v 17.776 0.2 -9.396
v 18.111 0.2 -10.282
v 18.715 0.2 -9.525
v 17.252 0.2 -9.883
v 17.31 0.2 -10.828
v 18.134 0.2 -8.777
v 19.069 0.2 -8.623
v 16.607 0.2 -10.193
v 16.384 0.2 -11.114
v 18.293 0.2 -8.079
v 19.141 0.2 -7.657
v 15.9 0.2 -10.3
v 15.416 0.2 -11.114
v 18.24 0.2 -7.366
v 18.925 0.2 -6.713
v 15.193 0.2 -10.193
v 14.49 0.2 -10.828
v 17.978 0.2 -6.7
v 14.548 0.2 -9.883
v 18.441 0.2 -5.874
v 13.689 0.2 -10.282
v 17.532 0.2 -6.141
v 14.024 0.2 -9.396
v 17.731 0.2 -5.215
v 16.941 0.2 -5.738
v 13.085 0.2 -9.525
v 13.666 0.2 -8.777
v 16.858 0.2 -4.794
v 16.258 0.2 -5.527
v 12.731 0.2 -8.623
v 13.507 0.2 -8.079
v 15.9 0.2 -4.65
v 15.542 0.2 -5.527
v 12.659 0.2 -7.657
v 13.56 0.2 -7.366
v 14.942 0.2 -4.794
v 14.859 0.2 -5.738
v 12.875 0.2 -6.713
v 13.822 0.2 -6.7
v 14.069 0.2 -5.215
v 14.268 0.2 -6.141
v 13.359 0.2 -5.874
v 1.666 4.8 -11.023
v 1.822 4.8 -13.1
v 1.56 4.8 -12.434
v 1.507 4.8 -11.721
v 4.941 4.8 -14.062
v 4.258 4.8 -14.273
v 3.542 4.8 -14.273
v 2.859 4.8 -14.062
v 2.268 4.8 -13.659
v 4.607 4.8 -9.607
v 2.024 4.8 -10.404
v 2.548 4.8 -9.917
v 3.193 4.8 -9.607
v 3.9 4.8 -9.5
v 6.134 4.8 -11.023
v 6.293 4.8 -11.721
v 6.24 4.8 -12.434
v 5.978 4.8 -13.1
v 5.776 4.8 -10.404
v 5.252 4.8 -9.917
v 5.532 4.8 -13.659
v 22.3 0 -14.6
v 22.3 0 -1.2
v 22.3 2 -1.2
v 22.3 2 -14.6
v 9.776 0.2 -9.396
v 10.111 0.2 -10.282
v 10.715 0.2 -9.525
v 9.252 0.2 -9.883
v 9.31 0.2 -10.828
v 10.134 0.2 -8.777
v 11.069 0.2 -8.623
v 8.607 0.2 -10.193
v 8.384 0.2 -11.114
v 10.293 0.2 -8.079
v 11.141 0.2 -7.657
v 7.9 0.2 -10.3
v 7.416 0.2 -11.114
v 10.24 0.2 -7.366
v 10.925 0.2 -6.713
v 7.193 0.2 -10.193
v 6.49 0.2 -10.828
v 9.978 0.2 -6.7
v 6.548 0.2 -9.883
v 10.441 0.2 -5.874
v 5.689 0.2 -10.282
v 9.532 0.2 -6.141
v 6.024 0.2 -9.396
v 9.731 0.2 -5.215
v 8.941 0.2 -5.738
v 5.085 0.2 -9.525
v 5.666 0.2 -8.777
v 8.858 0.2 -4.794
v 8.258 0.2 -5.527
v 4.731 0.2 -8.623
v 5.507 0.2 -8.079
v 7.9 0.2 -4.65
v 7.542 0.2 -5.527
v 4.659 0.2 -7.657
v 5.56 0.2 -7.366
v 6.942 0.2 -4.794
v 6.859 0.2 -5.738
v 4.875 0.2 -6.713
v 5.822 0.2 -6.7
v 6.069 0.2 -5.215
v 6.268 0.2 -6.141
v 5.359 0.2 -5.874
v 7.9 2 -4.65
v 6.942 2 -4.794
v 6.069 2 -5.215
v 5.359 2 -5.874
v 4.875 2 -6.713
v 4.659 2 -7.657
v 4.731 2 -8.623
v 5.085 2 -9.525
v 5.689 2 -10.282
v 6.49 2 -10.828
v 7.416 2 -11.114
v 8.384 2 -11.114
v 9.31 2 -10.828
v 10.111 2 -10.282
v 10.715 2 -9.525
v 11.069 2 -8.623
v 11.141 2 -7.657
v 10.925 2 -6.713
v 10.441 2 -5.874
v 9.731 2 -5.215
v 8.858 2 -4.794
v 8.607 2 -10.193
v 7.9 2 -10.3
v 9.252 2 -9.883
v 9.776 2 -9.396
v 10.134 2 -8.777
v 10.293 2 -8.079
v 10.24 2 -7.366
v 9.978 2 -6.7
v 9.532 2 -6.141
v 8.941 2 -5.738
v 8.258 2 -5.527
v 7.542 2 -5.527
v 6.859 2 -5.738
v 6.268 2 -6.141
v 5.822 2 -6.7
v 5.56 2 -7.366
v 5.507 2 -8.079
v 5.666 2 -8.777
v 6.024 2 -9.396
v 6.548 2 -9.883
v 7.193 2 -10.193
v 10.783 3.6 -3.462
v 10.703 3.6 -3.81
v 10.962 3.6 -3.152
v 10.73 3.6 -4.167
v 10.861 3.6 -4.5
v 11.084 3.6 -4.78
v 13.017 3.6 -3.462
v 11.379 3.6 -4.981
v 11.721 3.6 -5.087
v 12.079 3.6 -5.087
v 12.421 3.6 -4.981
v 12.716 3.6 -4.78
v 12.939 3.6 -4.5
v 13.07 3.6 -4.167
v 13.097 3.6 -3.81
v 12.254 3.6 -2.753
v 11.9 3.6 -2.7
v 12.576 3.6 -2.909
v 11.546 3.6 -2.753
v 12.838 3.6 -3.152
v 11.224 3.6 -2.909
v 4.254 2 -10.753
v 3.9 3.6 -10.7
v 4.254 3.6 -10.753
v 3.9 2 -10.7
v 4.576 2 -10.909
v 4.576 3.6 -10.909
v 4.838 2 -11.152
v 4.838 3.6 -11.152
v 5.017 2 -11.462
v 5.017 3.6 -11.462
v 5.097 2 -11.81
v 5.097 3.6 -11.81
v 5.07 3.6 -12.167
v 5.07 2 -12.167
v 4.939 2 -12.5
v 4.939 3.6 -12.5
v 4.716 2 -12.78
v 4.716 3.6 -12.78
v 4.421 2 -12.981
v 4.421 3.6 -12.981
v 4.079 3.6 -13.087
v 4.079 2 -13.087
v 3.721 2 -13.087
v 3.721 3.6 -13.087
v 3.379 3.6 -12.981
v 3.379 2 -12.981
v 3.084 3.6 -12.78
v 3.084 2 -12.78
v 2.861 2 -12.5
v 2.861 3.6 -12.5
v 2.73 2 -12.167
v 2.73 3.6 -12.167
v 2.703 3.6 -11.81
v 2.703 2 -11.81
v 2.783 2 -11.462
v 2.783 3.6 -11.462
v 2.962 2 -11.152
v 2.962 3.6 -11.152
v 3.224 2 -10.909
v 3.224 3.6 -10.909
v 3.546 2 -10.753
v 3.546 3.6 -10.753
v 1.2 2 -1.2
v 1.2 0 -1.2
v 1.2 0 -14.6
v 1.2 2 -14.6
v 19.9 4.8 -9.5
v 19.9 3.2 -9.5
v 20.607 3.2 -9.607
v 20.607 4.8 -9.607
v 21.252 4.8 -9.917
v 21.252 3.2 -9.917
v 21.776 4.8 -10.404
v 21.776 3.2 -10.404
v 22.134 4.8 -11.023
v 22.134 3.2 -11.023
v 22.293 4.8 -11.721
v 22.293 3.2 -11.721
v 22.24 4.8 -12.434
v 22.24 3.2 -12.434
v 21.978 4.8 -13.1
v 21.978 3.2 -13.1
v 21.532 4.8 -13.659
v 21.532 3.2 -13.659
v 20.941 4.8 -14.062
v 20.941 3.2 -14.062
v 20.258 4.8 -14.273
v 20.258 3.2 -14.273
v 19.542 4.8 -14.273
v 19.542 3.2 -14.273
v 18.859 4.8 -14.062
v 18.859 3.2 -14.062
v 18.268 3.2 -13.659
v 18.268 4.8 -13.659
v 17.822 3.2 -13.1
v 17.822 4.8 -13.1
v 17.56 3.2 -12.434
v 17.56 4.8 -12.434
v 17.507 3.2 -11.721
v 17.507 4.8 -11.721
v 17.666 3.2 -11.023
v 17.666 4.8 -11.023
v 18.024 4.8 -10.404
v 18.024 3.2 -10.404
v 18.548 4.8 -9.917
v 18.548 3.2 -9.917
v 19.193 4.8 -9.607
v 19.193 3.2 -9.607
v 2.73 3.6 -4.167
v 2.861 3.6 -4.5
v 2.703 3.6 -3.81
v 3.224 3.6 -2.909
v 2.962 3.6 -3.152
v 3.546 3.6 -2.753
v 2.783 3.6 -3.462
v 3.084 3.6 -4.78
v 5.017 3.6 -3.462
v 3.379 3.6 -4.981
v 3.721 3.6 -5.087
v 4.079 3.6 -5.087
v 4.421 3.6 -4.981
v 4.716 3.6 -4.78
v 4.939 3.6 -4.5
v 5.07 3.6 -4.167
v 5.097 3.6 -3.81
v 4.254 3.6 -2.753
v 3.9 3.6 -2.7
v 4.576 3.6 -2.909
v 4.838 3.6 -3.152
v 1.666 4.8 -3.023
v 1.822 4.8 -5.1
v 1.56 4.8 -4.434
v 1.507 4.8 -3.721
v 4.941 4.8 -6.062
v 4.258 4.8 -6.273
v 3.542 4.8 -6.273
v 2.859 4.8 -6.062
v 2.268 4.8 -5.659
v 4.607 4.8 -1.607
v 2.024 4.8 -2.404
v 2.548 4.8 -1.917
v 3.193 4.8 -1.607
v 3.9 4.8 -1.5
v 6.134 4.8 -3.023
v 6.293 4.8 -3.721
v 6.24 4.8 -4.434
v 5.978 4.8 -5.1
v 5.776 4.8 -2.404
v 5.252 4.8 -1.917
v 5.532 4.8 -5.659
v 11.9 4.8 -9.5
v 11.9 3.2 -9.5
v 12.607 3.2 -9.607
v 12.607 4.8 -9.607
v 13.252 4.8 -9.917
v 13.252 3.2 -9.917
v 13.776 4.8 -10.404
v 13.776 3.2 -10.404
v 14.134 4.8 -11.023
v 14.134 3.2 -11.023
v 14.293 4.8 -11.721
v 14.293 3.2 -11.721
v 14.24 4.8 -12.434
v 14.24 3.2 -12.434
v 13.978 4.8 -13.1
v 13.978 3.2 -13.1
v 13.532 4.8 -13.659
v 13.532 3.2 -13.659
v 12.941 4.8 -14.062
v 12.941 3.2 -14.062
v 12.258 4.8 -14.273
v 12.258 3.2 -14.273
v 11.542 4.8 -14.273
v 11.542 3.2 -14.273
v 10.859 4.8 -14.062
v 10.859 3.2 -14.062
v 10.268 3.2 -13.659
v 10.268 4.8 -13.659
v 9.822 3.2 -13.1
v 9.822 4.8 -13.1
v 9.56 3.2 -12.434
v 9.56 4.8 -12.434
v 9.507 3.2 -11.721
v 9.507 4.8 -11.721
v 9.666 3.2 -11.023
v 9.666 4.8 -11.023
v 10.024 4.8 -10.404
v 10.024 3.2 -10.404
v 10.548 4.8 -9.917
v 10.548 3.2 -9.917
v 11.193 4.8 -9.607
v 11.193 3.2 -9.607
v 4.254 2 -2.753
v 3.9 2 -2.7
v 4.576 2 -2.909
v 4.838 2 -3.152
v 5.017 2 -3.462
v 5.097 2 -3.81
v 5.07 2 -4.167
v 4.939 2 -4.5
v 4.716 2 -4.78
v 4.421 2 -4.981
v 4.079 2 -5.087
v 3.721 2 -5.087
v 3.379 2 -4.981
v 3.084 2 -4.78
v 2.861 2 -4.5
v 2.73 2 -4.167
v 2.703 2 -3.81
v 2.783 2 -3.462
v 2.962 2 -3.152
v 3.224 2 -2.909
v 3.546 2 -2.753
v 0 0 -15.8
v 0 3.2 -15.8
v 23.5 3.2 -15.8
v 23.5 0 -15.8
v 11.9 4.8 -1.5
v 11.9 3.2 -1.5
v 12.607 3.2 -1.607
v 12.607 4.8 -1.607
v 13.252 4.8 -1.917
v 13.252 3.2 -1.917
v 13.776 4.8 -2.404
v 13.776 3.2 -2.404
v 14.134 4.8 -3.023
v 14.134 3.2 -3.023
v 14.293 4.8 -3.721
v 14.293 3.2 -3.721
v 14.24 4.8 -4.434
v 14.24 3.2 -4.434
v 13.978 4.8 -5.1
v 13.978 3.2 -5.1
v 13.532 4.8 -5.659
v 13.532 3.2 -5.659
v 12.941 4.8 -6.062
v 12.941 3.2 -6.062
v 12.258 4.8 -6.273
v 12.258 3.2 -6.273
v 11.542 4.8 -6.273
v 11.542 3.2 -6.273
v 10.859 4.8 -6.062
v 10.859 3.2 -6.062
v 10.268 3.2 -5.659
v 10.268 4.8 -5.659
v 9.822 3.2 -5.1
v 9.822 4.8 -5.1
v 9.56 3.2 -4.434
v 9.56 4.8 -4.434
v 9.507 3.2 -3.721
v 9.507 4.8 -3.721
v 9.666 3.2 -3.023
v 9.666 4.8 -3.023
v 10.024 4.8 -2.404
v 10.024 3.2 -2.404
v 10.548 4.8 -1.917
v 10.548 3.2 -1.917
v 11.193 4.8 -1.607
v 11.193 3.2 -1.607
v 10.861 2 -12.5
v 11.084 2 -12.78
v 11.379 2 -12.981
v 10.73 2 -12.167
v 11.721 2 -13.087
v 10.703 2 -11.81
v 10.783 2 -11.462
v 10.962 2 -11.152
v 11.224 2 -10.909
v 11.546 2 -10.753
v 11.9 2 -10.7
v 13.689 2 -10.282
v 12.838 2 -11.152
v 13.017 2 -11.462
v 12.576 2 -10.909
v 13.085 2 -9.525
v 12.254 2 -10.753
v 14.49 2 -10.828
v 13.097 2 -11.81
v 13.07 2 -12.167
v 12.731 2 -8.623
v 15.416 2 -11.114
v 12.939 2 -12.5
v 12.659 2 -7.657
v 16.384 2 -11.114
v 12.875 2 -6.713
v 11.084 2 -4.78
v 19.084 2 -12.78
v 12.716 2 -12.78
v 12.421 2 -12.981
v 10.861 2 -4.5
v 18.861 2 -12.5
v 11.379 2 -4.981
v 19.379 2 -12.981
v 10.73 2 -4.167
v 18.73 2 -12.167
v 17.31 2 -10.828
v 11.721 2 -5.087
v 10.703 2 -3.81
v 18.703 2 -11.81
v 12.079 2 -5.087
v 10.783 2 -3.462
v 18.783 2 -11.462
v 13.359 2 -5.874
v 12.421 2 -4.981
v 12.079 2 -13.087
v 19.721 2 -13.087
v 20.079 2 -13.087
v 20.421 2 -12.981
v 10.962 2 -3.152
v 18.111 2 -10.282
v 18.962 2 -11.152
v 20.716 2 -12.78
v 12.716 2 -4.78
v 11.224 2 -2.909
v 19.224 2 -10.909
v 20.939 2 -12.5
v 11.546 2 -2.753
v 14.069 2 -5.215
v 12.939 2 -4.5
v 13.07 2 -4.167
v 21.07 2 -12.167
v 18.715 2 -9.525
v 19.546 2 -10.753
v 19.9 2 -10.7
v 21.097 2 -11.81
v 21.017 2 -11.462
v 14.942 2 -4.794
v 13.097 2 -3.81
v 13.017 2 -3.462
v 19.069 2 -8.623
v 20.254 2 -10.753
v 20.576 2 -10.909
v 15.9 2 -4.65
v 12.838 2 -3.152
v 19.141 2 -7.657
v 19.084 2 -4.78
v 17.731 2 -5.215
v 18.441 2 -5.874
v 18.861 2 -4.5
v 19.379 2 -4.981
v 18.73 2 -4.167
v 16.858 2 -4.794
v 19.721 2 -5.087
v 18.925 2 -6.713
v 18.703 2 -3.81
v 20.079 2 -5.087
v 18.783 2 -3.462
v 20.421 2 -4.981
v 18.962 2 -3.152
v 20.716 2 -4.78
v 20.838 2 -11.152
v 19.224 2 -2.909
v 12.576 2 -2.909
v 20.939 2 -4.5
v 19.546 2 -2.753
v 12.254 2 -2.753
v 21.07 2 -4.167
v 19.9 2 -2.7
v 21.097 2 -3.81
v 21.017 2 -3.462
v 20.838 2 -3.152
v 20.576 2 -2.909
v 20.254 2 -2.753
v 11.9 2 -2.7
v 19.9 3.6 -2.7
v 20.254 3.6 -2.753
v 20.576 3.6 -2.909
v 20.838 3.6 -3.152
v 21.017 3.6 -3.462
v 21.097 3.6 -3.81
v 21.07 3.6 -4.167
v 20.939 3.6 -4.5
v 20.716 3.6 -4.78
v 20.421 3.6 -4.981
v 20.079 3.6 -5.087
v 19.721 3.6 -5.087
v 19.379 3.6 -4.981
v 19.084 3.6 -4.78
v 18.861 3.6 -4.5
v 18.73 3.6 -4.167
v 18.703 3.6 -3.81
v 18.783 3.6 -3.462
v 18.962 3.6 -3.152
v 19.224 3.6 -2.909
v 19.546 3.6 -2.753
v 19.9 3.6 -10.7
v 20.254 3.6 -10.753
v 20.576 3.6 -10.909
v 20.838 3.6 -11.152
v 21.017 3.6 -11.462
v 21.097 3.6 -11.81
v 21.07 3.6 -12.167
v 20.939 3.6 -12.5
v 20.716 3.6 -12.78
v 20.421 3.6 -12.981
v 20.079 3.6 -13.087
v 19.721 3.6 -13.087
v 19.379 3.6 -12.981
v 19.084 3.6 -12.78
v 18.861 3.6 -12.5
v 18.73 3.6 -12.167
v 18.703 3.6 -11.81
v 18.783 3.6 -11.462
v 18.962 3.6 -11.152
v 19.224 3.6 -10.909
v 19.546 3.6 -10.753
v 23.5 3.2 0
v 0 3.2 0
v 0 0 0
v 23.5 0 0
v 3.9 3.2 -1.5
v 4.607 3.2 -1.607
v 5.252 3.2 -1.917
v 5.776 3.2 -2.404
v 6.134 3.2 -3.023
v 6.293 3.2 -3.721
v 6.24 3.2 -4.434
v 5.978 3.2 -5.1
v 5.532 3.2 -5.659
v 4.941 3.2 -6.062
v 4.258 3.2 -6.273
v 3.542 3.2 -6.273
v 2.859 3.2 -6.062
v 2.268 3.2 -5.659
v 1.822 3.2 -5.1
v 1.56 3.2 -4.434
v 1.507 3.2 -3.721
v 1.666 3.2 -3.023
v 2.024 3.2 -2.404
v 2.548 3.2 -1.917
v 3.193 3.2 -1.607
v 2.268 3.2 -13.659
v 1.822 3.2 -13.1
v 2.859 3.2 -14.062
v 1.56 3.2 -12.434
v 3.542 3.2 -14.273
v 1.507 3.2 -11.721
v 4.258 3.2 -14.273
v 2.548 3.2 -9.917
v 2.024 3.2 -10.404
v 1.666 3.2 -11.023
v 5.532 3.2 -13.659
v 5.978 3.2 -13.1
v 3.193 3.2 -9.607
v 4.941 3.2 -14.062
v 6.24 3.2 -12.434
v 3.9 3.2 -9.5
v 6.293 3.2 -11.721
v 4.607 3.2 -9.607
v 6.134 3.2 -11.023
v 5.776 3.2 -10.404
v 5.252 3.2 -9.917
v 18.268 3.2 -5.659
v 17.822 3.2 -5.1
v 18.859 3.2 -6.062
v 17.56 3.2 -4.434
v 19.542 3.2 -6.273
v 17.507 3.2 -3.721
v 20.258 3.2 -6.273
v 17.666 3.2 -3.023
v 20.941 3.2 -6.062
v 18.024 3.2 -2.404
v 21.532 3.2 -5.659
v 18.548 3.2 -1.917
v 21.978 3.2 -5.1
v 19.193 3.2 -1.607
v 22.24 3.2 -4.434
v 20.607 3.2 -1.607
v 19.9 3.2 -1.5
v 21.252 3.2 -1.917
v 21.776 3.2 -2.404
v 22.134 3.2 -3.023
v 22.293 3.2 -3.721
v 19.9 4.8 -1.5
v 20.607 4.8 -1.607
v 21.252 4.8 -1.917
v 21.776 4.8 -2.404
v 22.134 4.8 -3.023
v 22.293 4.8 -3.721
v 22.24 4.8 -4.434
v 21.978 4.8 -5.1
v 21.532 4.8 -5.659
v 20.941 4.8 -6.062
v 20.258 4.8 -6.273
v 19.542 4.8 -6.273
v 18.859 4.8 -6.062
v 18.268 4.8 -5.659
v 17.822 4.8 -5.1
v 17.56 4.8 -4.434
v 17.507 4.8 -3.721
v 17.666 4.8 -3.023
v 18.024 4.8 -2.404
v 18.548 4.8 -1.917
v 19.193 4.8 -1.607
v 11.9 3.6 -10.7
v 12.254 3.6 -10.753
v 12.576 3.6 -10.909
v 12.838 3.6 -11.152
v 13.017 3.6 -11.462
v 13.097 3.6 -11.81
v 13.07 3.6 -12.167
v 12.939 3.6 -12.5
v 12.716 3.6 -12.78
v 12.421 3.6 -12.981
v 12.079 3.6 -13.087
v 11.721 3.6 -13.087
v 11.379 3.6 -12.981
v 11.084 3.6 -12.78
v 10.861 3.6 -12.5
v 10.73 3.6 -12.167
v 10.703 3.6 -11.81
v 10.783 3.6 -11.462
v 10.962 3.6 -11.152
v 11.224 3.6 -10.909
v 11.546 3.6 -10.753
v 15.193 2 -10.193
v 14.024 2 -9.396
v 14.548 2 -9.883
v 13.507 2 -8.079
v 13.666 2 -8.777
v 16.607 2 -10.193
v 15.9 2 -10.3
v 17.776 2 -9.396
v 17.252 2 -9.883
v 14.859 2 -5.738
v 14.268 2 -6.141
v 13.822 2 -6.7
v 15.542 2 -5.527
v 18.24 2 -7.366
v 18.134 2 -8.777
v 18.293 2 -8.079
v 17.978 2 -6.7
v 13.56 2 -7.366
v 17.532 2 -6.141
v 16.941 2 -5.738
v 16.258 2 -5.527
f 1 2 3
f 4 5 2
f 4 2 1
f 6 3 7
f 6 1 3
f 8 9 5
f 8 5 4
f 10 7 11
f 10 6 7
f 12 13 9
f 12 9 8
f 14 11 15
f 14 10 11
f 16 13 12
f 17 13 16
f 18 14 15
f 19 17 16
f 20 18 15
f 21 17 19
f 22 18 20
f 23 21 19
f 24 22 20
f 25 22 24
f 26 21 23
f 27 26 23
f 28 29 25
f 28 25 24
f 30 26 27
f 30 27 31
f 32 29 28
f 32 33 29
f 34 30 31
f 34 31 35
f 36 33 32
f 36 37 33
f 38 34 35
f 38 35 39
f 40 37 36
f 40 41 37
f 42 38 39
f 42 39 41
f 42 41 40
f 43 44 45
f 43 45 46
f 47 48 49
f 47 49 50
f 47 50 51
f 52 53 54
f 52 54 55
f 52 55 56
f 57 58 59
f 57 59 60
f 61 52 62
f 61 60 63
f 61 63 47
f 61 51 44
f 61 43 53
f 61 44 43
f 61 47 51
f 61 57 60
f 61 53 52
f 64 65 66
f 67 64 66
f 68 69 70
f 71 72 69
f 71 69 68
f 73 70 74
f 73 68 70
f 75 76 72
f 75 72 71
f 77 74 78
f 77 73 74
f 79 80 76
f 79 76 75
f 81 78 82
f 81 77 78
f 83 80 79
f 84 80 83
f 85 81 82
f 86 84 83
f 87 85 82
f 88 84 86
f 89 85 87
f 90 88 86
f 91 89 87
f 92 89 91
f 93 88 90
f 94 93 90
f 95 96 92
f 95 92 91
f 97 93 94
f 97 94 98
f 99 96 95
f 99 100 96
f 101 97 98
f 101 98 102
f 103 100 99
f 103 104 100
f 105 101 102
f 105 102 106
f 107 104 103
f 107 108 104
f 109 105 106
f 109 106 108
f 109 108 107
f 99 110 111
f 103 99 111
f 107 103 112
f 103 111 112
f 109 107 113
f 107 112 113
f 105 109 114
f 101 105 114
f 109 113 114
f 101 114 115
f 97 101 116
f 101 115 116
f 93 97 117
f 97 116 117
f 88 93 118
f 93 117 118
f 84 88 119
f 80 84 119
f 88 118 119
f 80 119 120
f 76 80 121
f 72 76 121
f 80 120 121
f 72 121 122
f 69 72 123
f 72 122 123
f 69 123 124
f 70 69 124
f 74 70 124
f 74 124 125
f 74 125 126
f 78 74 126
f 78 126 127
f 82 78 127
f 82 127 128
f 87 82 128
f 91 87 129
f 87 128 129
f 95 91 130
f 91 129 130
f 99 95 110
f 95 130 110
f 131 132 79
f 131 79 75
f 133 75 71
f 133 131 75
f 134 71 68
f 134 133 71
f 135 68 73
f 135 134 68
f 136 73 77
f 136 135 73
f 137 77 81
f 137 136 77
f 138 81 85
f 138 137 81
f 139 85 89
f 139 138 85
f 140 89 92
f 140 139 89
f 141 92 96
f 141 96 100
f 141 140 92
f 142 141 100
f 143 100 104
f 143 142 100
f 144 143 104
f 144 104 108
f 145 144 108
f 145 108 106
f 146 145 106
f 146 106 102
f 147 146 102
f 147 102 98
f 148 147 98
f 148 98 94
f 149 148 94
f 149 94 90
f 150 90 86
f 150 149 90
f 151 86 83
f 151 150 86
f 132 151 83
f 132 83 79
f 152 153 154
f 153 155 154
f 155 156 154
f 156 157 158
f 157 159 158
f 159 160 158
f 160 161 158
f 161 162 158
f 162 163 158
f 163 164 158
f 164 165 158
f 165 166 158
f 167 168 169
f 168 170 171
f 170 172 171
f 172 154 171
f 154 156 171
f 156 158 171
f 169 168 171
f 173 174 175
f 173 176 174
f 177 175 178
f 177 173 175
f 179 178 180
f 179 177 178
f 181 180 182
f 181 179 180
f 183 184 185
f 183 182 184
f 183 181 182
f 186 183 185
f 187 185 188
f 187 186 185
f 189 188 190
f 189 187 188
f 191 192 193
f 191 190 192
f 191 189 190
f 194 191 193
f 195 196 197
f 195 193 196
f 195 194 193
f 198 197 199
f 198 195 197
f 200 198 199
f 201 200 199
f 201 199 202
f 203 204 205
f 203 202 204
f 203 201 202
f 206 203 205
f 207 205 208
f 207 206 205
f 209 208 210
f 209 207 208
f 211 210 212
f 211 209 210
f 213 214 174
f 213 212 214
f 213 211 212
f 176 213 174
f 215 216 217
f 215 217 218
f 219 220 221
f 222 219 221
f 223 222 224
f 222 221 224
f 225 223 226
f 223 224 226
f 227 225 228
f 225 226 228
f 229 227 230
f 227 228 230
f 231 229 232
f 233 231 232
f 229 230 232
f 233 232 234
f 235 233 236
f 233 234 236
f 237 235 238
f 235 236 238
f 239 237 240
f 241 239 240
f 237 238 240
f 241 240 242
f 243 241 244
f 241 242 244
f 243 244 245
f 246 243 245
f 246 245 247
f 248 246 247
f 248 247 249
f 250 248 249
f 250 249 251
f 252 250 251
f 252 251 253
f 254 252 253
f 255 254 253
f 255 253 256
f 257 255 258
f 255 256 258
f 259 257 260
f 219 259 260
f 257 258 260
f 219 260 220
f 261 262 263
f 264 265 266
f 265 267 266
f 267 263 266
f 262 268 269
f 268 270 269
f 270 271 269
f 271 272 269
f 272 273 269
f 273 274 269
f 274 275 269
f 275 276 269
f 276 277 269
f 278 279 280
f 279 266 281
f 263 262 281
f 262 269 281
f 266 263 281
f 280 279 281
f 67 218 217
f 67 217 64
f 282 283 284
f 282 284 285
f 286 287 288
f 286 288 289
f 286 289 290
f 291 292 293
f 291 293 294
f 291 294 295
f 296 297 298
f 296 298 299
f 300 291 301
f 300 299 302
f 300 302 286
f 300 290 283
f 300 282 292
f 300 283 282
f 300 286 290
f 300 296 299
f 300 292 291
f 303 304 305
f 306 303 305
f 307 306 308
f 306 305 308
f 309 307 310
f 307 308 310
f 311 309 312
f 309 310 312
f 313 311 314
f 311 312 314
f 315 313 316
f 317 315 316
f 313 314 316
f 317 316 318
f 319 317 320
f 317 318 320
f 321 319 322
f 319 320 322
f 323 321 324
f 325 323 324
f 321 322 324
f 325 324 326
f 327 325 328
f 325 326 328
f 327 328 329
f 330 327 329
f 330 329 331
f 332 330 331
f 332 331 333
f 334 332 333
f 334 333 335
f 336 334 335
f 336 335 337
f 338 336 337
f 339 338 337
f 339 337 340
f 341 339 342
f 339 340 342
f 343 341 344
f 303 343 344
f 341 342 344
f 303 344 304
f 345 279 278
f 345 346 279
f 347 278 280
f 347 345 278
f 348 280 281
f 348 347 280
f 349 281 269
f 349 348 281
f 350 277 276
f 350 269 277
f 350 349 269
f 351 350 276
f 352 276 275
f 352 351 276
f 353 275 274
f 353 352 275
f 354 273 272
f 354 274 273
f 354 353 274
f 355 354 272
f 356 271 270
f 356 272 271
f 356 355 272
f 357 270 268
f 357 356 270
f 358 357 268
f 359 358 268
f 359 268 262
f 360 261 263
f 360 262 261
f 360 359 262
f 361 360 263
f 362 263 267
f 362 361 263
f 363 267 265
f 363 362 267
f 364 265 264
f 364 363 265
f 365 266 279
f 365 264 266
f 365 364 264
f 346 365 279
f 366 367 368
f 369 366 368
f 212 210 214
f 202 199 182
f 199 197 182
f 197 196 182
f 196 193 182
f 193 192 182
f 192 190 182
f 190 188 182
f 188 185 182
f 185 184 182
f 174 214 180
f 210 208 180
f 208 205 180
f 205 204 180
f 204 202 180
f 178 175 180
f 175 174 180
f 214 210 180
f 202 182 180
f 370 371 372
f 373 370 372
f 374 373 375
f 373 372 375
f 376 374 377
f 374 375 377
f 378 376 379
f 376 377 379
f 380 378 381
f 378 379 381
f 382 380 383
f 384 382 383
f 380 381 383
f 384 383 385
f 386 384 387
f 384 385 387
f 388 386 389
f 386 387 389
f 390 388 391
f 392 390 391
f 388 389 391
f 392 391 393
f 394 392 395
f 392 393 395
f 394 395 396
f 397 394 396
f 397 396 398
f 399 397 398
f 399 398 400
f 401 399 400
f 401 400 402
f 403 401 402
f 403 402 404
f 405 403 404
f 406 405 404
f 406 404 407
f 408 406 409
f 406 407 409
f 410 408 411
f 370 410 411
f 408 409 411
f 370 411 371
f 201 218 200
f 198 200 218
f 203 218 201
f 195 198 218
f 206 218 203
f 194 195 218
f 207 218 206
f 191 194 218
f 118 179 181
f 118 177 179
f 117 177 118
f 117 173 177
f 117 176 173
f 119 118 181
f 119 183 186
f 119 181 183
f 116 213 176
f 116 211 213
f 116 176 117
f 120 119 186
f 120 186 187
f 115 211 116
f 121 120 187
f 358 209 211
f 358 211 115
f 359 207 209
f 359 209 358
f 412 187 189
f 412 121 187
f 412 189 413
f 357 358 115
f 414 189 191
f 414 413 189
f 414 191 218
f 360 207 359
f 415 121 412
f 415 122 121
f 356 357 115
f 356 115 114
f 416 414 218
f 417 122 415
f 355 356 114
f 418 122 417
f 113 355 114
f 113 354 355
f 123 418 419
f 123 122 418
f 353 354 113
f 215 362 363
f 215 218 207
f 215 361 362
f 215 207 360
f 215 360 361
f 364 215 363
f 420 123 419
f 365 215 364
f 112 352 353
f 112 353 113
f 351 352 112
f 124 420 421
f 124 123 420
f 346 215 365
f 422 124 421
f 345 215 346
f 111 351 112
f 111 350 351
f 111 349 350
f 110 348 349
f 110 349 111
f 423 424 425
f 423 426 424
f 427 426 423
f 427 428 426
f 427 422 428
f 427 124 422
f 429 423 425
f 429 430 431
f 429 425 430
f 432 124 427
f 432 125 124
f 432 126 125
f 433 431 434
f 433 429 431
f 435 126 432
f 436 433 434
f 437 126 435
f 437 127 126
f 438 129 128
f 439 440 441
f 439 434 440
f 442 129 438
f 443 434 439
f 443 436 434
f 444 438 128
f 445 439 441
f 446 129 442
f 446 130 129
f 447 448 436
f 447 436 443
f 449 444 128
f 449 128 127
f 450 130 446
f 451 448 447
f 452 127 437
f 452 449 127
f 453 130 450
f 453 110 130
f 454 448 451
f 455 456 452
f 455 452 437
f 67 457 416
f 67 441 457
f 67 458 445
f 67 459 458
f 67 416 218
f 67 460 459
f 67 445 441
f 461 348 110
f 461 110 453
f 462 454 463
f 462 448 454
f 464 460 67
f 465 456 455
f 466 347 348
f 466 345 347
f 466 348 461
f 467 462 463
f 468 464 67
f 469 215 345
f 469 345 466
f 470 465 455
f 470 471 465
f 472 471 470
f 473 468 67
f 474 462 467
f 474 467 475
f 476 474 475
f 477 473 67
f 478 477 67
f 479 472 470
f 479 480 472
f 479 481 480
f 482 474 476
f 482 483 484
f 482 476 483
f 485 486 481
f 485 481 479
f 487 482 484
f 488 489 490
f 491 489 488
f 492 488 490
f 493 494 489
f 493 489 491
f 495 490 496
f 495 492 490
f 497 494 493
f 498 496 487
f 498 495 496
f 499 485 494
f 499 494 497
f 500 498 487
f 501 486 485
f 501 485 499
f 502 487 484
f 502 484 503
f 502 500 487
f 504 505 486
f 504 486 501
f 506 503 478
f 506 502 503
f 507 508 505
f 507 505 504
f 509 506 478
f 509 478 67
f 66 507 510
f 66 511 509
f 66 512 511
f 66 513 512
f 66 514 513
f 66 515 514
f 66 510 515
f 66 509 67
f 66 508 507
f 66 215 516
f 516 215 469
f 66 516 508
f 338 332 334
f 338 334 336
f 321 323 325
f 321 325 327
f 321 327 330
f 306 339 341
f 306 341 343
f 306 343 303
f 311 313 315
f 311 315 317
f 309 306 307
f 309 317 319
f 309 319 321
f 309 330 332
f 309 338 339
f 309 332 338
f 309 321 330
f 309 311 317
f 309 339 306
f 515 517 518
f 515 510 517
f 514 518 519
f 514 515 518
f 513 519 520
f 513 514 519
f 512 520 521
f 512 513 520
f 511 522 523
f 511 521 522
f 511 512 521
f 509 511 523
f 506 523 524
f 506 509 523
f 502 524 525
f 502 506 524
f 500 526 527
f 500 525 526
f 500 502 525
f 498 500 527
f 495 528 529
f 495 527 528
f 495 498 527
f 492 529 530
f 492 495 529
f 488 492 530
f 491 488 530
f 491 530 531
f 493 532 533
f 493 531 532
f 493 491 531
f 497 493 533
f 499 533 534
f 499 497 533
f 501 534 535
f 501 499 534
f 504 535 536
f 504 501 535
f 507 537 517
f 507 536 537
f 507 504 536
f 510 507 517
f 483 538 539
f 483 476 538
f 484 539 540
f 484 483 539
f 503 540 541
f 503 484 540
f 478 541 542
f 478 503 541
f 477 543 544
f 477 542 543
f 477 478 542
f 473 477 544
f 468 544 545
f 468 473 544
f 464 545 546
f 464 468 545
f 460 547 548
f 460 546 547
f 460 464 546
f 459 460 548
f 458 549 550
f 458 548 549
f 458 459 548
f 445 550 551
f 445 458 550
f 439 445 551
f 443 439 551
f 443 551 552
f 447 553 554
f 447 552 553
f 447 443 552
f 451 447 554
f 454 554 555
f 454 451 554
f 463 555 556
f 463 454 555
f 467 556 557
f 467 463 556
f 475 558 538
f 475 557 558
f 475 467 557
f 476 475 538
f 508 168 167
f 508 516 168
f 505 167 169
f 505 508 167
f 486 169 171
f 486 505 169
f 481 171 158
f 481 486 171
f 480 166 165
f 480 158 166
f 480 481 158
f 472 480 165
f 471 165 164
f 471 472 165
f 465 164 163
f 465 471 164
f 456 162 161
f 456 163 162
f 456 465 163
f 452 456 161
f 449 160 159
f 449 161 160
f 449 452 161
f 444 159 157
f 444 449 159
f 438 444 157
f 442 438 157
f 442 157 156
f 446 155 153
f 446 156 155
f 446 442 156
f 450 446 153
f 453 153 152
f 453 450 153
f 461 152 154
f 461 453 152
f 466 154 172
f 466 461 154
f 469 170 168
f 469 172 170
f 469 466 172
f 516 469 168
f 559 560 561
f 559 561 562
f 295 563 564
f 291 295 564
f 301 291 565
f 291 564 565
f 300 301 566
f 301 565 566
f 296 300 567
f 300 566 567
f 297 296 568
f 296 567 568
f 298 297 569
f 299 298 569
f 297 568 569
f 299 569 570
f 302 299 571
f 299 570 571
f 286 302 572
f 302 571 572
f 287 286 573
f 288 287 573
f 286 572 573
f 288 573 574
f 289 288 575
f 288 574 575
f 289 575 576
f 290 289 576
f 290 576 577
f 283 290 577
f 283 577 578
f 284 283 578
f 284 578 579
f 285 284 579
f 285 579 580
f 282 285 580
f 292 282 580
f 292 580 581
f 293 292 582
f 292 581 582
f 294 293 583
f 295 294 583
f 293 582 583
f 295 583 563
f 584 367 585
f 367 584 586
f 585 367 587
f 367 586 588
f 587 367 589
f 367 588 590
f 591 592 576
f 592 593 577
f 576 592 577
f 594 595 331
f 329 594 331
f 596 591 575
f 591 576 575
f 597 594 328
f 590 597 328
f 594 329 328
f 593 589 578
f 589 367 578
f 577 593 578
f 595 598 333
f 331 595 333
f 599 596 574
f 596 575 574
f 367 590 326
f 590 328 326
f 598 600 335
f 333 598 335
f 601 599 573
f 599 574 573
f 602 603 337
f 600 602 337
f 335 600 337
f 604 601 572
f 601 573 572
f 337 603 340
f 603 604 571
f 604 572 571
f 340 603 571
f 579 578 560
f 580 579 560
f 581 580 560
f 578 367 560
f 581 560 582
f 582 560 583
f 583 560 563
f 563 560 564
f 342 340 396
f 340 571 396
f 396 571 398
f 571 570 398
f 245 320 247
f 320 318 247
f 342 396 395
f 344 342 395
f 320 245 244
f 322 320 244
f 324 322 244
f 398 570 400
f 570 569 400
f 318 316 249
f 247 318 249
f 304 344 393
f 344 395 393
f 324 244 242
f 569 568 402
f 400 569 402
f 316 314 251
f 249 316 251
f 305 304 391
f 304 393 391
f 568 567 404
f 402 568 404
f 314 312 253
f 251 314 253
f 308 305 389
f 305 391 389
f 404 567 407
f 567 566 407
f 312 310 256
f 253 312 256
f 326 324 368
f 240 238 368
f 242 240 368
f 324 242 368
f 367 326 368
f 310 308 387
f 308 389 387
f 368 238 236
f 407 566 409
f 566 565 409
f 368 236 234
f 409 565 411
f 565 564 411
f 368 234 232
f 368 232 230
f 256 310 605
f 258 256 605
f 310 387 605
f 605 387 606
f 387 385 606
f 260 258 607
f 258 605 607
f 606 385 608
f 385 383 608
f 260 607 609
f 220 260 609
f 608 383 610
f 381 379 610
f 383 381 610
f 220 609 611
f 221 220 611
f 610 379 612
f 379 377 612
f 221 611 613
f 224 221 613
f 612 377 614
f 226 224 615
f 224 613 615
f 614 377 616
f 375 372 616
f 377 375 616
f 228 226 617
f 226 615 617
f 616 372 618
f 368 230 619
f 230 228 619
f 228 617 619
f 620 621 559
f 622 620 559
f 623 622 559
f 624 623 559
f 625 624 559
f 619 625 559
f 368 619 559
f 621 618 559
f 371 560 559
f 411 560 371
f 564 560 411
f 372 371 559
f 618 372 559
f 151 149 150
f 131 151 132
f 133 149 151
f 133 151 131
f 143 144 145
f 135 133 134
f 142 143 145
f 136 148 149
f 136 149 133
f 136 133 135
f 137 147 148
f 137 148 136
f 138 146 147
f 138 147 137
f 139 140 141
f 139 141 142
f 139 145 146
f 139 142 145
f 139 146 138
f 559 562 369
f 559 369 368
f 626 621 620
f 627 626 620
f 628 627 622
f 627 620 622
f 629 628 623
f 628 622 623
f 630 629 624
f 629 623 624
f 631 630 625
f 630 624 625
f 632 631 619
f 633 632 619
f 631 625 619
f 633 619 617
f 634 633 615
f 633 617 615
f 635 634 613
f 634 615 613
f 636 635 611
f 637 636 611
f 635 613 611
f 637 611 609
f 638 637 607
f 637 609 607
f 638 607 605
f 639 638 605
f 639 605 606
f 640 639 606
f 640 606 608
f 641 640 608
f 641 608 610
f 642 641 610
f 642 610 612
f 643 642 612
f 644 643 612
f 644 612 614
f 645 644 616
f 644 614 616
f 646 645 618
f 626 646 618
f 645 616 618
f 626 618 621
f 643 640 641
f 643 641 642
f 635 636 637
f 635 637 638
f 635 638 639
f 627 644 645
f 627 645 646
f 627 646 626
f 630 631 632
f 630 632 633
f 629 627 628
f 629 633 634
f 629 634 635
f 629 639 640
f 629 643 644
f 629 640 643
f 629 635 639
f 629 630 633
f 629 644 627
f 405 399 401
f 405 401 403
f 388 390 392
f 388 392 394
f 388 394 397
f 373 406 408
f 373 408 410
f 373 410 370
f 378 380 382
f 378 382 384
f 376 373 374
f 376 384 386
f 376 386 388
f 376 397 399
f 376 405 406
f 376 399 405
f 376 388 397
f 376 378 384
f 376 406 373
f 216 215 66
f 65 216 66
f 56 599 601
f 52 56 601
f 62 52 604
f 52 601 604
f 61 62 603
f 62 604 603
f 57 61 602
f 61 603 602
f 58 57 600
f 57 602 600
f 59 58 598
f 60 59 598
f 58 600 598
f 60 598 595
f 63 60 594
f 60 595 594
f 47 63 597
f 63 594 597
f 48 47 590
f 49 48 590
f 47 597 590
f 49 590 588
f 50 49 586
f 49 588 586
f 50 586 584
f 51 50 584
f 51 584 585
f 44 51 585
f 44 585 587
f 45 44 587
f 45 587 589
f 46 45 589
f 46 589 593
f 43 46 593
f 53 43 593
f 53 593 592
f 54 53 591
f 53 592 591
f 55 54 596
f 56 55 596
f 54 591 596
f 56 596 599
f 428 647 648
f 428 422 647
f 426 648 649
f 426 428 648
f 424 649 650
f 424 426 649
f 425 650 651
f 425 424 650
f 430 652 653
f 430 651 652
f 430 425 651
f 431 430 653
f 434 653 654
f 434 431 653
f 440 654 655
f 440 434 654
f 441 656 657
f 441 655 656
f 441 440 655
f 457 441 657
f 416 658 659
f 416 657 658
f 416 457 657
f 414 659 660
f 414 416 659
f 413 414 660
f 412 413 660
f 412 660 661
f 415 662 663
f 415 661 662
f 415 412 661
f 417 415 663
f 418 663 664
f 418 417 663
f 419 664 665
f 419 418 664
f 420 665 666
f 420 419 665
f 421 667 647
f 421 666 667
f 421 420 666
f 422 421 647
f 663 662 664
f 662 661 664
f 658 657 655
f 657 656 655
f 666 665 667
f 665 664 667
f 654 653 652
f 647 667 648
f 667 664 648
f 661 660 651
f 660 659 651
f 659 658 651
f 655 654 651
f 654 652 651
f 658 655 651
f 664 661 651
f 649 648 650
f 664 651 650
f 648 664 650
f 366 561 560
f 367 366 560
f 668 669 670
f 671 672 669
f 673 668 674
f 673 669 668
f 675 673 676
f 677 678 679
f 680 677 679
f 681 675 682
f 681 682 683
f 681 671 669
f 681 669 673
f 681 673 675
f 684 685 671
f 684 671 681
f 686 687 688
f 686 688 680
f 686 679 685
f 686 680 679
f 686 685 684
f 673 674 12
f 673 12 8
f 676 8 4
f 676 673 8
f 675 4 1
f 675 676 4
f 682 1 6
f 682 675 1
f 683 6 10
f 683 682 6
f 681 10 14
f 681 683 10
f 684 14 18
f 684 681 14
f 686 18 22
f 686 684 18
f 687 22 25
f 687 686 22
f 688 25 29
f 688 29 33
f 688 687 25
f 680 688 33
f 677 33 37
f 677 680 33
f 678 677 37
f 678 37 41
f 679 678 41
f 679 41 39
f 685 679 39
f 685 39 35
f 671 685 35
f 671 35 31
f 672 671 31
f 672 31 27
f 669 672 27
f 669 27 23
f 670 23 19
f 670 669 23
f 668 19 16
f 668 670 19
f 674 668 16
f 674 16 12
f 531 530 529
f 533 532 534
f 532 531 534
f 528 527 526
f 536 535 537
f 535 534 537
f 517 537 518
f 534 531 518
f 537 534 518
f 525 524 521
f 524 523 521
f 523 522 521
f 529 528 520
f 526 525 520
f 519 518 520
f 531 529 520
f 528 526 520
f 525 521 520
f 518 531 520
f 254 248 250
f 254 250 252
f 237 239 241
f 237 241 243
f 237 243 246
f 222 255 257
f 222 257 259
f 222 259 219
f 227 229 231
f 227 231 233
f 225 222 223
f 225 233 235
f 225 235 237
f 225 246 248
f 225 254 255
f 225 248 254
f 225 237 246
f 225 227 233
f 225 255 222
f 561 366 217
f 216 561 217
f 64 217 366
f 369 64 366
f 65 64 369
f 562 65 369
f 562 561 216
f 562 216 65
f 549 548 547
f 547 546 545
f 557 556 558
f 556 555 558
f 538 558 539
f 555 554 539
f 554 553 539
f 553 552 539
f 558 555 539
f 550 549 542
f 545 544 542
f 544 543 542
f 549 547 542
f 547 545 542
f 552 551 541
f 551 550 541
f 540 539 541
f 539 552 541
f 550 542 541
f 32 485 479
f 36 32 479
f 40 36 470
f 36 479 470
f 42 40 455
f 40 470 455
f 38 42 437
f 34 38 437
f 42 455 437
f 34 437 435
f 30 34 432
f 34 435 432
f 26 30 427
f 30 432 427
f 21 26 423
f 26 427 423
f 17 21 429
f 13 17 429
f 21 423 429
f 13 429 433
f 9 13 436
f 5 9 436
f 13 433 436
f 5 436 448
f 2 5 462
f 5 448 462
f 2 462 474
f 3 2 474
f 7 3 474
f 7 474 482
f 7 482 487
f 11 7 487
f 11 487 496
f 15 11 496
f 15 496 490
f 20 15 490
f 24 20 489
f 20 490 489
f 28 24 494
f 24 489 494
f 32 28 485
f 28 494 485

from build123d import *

# Parameters (mm, degrees)
SKETCH1_W            = 23.5
SKETCH1_H            = 3.2
BOSS_EXTRUDE1_DEPTH  = 15.8
SKETCH2_R            = 2.4
BOSS_EXTRUDE2_DEPTH  = 1.6
LPATTERN1_COUNT      = 2
LPATTERN1_PITCH      = 8
LPATTERN1_COUNT_DIR2 = 4
LPATTERN1_PITCH_DIR2 = 8
SHELL1_T             = -1.2
SKETCH4_R            = 3.25
SKETCH4_R_2          = 2.4
BOSS_EXTRUDE3_DEPTH  = 1.8
LPATTERN2_COUNT      = 2
LPATTERN2_PITCH      = 8


with BuildPart() as part:
    # Sketch1 → Boss-Extrude1 (new body)
    with BuildSketch(Plane.XY):
        with Locations((11.75, 1.6)):
            Rectangle(SKETCH1_W, SKETCH1_H)
    extrude(amount=-BOSS_EXTRUDE1_DEPTH)

    # Sketch2 → Boss-Extrude2 (add)
    with BuildSketch(Plane(origin=(0, 3.2, 0), x_dir=(1, 0, 0), z_dir=(0, 1, 0))):
        with Locations(Location((3.9, 3.9, 0), (0, 0, 270))):
            Circle(SKETCH2_R)
    boss_extrude2 = extrude(amount=BOSS_EXTRUDE2_DEPTH)

    # LPattern1: Boss-Extrude2 2 × 4, 2 skipped
    with Locations(*[(j * LPATTERN1_PITCH_DIR2, 0, -i * LPATTERN1_PITCH) for i in range(LPATTERN1_COUNT) for j in range(LPATTERN1_COUNT_DIR2) if (i, j) not in ((0, 0), (0, 3), (1, 3))]):
        add(boss_extrude2)

    # Shell1
    shell1_openings = [part.faces().sort_by_distance(p)[0] for p in [
        (11.75, 0, -7.9),
    ]]
    offset(amount=SHELL1_T, openings=shell1_openings, kind=Kind.INTERSECTION)

    # Sketch4 → Boss-Extrude3 (add)
    with BuildSketch(Plane.XZ.offset(-2)):
        with Locations(Location((7.9, -7.9, 0), (0, 0, 90))):
            Circle(SKETCH4_R)
        with Locations(Location((7.9, -7.9, 0), (0, 0, 270))):
            Circle(SKETCH4_R_2, mode=Mode.SUBTRACT)
    boss_extrude3 = extrude(amount=BOSS_EXTRUDE3_DEPTH)

    # LPattern2: Boss-Extrude3 ×2
    with Locations(*[(i * LPATTERN2_PITCH, 0, 0) for i in range(1, LPATTERN2_COUNT)]):
        add(boss_extrude3)


solid = part.part
